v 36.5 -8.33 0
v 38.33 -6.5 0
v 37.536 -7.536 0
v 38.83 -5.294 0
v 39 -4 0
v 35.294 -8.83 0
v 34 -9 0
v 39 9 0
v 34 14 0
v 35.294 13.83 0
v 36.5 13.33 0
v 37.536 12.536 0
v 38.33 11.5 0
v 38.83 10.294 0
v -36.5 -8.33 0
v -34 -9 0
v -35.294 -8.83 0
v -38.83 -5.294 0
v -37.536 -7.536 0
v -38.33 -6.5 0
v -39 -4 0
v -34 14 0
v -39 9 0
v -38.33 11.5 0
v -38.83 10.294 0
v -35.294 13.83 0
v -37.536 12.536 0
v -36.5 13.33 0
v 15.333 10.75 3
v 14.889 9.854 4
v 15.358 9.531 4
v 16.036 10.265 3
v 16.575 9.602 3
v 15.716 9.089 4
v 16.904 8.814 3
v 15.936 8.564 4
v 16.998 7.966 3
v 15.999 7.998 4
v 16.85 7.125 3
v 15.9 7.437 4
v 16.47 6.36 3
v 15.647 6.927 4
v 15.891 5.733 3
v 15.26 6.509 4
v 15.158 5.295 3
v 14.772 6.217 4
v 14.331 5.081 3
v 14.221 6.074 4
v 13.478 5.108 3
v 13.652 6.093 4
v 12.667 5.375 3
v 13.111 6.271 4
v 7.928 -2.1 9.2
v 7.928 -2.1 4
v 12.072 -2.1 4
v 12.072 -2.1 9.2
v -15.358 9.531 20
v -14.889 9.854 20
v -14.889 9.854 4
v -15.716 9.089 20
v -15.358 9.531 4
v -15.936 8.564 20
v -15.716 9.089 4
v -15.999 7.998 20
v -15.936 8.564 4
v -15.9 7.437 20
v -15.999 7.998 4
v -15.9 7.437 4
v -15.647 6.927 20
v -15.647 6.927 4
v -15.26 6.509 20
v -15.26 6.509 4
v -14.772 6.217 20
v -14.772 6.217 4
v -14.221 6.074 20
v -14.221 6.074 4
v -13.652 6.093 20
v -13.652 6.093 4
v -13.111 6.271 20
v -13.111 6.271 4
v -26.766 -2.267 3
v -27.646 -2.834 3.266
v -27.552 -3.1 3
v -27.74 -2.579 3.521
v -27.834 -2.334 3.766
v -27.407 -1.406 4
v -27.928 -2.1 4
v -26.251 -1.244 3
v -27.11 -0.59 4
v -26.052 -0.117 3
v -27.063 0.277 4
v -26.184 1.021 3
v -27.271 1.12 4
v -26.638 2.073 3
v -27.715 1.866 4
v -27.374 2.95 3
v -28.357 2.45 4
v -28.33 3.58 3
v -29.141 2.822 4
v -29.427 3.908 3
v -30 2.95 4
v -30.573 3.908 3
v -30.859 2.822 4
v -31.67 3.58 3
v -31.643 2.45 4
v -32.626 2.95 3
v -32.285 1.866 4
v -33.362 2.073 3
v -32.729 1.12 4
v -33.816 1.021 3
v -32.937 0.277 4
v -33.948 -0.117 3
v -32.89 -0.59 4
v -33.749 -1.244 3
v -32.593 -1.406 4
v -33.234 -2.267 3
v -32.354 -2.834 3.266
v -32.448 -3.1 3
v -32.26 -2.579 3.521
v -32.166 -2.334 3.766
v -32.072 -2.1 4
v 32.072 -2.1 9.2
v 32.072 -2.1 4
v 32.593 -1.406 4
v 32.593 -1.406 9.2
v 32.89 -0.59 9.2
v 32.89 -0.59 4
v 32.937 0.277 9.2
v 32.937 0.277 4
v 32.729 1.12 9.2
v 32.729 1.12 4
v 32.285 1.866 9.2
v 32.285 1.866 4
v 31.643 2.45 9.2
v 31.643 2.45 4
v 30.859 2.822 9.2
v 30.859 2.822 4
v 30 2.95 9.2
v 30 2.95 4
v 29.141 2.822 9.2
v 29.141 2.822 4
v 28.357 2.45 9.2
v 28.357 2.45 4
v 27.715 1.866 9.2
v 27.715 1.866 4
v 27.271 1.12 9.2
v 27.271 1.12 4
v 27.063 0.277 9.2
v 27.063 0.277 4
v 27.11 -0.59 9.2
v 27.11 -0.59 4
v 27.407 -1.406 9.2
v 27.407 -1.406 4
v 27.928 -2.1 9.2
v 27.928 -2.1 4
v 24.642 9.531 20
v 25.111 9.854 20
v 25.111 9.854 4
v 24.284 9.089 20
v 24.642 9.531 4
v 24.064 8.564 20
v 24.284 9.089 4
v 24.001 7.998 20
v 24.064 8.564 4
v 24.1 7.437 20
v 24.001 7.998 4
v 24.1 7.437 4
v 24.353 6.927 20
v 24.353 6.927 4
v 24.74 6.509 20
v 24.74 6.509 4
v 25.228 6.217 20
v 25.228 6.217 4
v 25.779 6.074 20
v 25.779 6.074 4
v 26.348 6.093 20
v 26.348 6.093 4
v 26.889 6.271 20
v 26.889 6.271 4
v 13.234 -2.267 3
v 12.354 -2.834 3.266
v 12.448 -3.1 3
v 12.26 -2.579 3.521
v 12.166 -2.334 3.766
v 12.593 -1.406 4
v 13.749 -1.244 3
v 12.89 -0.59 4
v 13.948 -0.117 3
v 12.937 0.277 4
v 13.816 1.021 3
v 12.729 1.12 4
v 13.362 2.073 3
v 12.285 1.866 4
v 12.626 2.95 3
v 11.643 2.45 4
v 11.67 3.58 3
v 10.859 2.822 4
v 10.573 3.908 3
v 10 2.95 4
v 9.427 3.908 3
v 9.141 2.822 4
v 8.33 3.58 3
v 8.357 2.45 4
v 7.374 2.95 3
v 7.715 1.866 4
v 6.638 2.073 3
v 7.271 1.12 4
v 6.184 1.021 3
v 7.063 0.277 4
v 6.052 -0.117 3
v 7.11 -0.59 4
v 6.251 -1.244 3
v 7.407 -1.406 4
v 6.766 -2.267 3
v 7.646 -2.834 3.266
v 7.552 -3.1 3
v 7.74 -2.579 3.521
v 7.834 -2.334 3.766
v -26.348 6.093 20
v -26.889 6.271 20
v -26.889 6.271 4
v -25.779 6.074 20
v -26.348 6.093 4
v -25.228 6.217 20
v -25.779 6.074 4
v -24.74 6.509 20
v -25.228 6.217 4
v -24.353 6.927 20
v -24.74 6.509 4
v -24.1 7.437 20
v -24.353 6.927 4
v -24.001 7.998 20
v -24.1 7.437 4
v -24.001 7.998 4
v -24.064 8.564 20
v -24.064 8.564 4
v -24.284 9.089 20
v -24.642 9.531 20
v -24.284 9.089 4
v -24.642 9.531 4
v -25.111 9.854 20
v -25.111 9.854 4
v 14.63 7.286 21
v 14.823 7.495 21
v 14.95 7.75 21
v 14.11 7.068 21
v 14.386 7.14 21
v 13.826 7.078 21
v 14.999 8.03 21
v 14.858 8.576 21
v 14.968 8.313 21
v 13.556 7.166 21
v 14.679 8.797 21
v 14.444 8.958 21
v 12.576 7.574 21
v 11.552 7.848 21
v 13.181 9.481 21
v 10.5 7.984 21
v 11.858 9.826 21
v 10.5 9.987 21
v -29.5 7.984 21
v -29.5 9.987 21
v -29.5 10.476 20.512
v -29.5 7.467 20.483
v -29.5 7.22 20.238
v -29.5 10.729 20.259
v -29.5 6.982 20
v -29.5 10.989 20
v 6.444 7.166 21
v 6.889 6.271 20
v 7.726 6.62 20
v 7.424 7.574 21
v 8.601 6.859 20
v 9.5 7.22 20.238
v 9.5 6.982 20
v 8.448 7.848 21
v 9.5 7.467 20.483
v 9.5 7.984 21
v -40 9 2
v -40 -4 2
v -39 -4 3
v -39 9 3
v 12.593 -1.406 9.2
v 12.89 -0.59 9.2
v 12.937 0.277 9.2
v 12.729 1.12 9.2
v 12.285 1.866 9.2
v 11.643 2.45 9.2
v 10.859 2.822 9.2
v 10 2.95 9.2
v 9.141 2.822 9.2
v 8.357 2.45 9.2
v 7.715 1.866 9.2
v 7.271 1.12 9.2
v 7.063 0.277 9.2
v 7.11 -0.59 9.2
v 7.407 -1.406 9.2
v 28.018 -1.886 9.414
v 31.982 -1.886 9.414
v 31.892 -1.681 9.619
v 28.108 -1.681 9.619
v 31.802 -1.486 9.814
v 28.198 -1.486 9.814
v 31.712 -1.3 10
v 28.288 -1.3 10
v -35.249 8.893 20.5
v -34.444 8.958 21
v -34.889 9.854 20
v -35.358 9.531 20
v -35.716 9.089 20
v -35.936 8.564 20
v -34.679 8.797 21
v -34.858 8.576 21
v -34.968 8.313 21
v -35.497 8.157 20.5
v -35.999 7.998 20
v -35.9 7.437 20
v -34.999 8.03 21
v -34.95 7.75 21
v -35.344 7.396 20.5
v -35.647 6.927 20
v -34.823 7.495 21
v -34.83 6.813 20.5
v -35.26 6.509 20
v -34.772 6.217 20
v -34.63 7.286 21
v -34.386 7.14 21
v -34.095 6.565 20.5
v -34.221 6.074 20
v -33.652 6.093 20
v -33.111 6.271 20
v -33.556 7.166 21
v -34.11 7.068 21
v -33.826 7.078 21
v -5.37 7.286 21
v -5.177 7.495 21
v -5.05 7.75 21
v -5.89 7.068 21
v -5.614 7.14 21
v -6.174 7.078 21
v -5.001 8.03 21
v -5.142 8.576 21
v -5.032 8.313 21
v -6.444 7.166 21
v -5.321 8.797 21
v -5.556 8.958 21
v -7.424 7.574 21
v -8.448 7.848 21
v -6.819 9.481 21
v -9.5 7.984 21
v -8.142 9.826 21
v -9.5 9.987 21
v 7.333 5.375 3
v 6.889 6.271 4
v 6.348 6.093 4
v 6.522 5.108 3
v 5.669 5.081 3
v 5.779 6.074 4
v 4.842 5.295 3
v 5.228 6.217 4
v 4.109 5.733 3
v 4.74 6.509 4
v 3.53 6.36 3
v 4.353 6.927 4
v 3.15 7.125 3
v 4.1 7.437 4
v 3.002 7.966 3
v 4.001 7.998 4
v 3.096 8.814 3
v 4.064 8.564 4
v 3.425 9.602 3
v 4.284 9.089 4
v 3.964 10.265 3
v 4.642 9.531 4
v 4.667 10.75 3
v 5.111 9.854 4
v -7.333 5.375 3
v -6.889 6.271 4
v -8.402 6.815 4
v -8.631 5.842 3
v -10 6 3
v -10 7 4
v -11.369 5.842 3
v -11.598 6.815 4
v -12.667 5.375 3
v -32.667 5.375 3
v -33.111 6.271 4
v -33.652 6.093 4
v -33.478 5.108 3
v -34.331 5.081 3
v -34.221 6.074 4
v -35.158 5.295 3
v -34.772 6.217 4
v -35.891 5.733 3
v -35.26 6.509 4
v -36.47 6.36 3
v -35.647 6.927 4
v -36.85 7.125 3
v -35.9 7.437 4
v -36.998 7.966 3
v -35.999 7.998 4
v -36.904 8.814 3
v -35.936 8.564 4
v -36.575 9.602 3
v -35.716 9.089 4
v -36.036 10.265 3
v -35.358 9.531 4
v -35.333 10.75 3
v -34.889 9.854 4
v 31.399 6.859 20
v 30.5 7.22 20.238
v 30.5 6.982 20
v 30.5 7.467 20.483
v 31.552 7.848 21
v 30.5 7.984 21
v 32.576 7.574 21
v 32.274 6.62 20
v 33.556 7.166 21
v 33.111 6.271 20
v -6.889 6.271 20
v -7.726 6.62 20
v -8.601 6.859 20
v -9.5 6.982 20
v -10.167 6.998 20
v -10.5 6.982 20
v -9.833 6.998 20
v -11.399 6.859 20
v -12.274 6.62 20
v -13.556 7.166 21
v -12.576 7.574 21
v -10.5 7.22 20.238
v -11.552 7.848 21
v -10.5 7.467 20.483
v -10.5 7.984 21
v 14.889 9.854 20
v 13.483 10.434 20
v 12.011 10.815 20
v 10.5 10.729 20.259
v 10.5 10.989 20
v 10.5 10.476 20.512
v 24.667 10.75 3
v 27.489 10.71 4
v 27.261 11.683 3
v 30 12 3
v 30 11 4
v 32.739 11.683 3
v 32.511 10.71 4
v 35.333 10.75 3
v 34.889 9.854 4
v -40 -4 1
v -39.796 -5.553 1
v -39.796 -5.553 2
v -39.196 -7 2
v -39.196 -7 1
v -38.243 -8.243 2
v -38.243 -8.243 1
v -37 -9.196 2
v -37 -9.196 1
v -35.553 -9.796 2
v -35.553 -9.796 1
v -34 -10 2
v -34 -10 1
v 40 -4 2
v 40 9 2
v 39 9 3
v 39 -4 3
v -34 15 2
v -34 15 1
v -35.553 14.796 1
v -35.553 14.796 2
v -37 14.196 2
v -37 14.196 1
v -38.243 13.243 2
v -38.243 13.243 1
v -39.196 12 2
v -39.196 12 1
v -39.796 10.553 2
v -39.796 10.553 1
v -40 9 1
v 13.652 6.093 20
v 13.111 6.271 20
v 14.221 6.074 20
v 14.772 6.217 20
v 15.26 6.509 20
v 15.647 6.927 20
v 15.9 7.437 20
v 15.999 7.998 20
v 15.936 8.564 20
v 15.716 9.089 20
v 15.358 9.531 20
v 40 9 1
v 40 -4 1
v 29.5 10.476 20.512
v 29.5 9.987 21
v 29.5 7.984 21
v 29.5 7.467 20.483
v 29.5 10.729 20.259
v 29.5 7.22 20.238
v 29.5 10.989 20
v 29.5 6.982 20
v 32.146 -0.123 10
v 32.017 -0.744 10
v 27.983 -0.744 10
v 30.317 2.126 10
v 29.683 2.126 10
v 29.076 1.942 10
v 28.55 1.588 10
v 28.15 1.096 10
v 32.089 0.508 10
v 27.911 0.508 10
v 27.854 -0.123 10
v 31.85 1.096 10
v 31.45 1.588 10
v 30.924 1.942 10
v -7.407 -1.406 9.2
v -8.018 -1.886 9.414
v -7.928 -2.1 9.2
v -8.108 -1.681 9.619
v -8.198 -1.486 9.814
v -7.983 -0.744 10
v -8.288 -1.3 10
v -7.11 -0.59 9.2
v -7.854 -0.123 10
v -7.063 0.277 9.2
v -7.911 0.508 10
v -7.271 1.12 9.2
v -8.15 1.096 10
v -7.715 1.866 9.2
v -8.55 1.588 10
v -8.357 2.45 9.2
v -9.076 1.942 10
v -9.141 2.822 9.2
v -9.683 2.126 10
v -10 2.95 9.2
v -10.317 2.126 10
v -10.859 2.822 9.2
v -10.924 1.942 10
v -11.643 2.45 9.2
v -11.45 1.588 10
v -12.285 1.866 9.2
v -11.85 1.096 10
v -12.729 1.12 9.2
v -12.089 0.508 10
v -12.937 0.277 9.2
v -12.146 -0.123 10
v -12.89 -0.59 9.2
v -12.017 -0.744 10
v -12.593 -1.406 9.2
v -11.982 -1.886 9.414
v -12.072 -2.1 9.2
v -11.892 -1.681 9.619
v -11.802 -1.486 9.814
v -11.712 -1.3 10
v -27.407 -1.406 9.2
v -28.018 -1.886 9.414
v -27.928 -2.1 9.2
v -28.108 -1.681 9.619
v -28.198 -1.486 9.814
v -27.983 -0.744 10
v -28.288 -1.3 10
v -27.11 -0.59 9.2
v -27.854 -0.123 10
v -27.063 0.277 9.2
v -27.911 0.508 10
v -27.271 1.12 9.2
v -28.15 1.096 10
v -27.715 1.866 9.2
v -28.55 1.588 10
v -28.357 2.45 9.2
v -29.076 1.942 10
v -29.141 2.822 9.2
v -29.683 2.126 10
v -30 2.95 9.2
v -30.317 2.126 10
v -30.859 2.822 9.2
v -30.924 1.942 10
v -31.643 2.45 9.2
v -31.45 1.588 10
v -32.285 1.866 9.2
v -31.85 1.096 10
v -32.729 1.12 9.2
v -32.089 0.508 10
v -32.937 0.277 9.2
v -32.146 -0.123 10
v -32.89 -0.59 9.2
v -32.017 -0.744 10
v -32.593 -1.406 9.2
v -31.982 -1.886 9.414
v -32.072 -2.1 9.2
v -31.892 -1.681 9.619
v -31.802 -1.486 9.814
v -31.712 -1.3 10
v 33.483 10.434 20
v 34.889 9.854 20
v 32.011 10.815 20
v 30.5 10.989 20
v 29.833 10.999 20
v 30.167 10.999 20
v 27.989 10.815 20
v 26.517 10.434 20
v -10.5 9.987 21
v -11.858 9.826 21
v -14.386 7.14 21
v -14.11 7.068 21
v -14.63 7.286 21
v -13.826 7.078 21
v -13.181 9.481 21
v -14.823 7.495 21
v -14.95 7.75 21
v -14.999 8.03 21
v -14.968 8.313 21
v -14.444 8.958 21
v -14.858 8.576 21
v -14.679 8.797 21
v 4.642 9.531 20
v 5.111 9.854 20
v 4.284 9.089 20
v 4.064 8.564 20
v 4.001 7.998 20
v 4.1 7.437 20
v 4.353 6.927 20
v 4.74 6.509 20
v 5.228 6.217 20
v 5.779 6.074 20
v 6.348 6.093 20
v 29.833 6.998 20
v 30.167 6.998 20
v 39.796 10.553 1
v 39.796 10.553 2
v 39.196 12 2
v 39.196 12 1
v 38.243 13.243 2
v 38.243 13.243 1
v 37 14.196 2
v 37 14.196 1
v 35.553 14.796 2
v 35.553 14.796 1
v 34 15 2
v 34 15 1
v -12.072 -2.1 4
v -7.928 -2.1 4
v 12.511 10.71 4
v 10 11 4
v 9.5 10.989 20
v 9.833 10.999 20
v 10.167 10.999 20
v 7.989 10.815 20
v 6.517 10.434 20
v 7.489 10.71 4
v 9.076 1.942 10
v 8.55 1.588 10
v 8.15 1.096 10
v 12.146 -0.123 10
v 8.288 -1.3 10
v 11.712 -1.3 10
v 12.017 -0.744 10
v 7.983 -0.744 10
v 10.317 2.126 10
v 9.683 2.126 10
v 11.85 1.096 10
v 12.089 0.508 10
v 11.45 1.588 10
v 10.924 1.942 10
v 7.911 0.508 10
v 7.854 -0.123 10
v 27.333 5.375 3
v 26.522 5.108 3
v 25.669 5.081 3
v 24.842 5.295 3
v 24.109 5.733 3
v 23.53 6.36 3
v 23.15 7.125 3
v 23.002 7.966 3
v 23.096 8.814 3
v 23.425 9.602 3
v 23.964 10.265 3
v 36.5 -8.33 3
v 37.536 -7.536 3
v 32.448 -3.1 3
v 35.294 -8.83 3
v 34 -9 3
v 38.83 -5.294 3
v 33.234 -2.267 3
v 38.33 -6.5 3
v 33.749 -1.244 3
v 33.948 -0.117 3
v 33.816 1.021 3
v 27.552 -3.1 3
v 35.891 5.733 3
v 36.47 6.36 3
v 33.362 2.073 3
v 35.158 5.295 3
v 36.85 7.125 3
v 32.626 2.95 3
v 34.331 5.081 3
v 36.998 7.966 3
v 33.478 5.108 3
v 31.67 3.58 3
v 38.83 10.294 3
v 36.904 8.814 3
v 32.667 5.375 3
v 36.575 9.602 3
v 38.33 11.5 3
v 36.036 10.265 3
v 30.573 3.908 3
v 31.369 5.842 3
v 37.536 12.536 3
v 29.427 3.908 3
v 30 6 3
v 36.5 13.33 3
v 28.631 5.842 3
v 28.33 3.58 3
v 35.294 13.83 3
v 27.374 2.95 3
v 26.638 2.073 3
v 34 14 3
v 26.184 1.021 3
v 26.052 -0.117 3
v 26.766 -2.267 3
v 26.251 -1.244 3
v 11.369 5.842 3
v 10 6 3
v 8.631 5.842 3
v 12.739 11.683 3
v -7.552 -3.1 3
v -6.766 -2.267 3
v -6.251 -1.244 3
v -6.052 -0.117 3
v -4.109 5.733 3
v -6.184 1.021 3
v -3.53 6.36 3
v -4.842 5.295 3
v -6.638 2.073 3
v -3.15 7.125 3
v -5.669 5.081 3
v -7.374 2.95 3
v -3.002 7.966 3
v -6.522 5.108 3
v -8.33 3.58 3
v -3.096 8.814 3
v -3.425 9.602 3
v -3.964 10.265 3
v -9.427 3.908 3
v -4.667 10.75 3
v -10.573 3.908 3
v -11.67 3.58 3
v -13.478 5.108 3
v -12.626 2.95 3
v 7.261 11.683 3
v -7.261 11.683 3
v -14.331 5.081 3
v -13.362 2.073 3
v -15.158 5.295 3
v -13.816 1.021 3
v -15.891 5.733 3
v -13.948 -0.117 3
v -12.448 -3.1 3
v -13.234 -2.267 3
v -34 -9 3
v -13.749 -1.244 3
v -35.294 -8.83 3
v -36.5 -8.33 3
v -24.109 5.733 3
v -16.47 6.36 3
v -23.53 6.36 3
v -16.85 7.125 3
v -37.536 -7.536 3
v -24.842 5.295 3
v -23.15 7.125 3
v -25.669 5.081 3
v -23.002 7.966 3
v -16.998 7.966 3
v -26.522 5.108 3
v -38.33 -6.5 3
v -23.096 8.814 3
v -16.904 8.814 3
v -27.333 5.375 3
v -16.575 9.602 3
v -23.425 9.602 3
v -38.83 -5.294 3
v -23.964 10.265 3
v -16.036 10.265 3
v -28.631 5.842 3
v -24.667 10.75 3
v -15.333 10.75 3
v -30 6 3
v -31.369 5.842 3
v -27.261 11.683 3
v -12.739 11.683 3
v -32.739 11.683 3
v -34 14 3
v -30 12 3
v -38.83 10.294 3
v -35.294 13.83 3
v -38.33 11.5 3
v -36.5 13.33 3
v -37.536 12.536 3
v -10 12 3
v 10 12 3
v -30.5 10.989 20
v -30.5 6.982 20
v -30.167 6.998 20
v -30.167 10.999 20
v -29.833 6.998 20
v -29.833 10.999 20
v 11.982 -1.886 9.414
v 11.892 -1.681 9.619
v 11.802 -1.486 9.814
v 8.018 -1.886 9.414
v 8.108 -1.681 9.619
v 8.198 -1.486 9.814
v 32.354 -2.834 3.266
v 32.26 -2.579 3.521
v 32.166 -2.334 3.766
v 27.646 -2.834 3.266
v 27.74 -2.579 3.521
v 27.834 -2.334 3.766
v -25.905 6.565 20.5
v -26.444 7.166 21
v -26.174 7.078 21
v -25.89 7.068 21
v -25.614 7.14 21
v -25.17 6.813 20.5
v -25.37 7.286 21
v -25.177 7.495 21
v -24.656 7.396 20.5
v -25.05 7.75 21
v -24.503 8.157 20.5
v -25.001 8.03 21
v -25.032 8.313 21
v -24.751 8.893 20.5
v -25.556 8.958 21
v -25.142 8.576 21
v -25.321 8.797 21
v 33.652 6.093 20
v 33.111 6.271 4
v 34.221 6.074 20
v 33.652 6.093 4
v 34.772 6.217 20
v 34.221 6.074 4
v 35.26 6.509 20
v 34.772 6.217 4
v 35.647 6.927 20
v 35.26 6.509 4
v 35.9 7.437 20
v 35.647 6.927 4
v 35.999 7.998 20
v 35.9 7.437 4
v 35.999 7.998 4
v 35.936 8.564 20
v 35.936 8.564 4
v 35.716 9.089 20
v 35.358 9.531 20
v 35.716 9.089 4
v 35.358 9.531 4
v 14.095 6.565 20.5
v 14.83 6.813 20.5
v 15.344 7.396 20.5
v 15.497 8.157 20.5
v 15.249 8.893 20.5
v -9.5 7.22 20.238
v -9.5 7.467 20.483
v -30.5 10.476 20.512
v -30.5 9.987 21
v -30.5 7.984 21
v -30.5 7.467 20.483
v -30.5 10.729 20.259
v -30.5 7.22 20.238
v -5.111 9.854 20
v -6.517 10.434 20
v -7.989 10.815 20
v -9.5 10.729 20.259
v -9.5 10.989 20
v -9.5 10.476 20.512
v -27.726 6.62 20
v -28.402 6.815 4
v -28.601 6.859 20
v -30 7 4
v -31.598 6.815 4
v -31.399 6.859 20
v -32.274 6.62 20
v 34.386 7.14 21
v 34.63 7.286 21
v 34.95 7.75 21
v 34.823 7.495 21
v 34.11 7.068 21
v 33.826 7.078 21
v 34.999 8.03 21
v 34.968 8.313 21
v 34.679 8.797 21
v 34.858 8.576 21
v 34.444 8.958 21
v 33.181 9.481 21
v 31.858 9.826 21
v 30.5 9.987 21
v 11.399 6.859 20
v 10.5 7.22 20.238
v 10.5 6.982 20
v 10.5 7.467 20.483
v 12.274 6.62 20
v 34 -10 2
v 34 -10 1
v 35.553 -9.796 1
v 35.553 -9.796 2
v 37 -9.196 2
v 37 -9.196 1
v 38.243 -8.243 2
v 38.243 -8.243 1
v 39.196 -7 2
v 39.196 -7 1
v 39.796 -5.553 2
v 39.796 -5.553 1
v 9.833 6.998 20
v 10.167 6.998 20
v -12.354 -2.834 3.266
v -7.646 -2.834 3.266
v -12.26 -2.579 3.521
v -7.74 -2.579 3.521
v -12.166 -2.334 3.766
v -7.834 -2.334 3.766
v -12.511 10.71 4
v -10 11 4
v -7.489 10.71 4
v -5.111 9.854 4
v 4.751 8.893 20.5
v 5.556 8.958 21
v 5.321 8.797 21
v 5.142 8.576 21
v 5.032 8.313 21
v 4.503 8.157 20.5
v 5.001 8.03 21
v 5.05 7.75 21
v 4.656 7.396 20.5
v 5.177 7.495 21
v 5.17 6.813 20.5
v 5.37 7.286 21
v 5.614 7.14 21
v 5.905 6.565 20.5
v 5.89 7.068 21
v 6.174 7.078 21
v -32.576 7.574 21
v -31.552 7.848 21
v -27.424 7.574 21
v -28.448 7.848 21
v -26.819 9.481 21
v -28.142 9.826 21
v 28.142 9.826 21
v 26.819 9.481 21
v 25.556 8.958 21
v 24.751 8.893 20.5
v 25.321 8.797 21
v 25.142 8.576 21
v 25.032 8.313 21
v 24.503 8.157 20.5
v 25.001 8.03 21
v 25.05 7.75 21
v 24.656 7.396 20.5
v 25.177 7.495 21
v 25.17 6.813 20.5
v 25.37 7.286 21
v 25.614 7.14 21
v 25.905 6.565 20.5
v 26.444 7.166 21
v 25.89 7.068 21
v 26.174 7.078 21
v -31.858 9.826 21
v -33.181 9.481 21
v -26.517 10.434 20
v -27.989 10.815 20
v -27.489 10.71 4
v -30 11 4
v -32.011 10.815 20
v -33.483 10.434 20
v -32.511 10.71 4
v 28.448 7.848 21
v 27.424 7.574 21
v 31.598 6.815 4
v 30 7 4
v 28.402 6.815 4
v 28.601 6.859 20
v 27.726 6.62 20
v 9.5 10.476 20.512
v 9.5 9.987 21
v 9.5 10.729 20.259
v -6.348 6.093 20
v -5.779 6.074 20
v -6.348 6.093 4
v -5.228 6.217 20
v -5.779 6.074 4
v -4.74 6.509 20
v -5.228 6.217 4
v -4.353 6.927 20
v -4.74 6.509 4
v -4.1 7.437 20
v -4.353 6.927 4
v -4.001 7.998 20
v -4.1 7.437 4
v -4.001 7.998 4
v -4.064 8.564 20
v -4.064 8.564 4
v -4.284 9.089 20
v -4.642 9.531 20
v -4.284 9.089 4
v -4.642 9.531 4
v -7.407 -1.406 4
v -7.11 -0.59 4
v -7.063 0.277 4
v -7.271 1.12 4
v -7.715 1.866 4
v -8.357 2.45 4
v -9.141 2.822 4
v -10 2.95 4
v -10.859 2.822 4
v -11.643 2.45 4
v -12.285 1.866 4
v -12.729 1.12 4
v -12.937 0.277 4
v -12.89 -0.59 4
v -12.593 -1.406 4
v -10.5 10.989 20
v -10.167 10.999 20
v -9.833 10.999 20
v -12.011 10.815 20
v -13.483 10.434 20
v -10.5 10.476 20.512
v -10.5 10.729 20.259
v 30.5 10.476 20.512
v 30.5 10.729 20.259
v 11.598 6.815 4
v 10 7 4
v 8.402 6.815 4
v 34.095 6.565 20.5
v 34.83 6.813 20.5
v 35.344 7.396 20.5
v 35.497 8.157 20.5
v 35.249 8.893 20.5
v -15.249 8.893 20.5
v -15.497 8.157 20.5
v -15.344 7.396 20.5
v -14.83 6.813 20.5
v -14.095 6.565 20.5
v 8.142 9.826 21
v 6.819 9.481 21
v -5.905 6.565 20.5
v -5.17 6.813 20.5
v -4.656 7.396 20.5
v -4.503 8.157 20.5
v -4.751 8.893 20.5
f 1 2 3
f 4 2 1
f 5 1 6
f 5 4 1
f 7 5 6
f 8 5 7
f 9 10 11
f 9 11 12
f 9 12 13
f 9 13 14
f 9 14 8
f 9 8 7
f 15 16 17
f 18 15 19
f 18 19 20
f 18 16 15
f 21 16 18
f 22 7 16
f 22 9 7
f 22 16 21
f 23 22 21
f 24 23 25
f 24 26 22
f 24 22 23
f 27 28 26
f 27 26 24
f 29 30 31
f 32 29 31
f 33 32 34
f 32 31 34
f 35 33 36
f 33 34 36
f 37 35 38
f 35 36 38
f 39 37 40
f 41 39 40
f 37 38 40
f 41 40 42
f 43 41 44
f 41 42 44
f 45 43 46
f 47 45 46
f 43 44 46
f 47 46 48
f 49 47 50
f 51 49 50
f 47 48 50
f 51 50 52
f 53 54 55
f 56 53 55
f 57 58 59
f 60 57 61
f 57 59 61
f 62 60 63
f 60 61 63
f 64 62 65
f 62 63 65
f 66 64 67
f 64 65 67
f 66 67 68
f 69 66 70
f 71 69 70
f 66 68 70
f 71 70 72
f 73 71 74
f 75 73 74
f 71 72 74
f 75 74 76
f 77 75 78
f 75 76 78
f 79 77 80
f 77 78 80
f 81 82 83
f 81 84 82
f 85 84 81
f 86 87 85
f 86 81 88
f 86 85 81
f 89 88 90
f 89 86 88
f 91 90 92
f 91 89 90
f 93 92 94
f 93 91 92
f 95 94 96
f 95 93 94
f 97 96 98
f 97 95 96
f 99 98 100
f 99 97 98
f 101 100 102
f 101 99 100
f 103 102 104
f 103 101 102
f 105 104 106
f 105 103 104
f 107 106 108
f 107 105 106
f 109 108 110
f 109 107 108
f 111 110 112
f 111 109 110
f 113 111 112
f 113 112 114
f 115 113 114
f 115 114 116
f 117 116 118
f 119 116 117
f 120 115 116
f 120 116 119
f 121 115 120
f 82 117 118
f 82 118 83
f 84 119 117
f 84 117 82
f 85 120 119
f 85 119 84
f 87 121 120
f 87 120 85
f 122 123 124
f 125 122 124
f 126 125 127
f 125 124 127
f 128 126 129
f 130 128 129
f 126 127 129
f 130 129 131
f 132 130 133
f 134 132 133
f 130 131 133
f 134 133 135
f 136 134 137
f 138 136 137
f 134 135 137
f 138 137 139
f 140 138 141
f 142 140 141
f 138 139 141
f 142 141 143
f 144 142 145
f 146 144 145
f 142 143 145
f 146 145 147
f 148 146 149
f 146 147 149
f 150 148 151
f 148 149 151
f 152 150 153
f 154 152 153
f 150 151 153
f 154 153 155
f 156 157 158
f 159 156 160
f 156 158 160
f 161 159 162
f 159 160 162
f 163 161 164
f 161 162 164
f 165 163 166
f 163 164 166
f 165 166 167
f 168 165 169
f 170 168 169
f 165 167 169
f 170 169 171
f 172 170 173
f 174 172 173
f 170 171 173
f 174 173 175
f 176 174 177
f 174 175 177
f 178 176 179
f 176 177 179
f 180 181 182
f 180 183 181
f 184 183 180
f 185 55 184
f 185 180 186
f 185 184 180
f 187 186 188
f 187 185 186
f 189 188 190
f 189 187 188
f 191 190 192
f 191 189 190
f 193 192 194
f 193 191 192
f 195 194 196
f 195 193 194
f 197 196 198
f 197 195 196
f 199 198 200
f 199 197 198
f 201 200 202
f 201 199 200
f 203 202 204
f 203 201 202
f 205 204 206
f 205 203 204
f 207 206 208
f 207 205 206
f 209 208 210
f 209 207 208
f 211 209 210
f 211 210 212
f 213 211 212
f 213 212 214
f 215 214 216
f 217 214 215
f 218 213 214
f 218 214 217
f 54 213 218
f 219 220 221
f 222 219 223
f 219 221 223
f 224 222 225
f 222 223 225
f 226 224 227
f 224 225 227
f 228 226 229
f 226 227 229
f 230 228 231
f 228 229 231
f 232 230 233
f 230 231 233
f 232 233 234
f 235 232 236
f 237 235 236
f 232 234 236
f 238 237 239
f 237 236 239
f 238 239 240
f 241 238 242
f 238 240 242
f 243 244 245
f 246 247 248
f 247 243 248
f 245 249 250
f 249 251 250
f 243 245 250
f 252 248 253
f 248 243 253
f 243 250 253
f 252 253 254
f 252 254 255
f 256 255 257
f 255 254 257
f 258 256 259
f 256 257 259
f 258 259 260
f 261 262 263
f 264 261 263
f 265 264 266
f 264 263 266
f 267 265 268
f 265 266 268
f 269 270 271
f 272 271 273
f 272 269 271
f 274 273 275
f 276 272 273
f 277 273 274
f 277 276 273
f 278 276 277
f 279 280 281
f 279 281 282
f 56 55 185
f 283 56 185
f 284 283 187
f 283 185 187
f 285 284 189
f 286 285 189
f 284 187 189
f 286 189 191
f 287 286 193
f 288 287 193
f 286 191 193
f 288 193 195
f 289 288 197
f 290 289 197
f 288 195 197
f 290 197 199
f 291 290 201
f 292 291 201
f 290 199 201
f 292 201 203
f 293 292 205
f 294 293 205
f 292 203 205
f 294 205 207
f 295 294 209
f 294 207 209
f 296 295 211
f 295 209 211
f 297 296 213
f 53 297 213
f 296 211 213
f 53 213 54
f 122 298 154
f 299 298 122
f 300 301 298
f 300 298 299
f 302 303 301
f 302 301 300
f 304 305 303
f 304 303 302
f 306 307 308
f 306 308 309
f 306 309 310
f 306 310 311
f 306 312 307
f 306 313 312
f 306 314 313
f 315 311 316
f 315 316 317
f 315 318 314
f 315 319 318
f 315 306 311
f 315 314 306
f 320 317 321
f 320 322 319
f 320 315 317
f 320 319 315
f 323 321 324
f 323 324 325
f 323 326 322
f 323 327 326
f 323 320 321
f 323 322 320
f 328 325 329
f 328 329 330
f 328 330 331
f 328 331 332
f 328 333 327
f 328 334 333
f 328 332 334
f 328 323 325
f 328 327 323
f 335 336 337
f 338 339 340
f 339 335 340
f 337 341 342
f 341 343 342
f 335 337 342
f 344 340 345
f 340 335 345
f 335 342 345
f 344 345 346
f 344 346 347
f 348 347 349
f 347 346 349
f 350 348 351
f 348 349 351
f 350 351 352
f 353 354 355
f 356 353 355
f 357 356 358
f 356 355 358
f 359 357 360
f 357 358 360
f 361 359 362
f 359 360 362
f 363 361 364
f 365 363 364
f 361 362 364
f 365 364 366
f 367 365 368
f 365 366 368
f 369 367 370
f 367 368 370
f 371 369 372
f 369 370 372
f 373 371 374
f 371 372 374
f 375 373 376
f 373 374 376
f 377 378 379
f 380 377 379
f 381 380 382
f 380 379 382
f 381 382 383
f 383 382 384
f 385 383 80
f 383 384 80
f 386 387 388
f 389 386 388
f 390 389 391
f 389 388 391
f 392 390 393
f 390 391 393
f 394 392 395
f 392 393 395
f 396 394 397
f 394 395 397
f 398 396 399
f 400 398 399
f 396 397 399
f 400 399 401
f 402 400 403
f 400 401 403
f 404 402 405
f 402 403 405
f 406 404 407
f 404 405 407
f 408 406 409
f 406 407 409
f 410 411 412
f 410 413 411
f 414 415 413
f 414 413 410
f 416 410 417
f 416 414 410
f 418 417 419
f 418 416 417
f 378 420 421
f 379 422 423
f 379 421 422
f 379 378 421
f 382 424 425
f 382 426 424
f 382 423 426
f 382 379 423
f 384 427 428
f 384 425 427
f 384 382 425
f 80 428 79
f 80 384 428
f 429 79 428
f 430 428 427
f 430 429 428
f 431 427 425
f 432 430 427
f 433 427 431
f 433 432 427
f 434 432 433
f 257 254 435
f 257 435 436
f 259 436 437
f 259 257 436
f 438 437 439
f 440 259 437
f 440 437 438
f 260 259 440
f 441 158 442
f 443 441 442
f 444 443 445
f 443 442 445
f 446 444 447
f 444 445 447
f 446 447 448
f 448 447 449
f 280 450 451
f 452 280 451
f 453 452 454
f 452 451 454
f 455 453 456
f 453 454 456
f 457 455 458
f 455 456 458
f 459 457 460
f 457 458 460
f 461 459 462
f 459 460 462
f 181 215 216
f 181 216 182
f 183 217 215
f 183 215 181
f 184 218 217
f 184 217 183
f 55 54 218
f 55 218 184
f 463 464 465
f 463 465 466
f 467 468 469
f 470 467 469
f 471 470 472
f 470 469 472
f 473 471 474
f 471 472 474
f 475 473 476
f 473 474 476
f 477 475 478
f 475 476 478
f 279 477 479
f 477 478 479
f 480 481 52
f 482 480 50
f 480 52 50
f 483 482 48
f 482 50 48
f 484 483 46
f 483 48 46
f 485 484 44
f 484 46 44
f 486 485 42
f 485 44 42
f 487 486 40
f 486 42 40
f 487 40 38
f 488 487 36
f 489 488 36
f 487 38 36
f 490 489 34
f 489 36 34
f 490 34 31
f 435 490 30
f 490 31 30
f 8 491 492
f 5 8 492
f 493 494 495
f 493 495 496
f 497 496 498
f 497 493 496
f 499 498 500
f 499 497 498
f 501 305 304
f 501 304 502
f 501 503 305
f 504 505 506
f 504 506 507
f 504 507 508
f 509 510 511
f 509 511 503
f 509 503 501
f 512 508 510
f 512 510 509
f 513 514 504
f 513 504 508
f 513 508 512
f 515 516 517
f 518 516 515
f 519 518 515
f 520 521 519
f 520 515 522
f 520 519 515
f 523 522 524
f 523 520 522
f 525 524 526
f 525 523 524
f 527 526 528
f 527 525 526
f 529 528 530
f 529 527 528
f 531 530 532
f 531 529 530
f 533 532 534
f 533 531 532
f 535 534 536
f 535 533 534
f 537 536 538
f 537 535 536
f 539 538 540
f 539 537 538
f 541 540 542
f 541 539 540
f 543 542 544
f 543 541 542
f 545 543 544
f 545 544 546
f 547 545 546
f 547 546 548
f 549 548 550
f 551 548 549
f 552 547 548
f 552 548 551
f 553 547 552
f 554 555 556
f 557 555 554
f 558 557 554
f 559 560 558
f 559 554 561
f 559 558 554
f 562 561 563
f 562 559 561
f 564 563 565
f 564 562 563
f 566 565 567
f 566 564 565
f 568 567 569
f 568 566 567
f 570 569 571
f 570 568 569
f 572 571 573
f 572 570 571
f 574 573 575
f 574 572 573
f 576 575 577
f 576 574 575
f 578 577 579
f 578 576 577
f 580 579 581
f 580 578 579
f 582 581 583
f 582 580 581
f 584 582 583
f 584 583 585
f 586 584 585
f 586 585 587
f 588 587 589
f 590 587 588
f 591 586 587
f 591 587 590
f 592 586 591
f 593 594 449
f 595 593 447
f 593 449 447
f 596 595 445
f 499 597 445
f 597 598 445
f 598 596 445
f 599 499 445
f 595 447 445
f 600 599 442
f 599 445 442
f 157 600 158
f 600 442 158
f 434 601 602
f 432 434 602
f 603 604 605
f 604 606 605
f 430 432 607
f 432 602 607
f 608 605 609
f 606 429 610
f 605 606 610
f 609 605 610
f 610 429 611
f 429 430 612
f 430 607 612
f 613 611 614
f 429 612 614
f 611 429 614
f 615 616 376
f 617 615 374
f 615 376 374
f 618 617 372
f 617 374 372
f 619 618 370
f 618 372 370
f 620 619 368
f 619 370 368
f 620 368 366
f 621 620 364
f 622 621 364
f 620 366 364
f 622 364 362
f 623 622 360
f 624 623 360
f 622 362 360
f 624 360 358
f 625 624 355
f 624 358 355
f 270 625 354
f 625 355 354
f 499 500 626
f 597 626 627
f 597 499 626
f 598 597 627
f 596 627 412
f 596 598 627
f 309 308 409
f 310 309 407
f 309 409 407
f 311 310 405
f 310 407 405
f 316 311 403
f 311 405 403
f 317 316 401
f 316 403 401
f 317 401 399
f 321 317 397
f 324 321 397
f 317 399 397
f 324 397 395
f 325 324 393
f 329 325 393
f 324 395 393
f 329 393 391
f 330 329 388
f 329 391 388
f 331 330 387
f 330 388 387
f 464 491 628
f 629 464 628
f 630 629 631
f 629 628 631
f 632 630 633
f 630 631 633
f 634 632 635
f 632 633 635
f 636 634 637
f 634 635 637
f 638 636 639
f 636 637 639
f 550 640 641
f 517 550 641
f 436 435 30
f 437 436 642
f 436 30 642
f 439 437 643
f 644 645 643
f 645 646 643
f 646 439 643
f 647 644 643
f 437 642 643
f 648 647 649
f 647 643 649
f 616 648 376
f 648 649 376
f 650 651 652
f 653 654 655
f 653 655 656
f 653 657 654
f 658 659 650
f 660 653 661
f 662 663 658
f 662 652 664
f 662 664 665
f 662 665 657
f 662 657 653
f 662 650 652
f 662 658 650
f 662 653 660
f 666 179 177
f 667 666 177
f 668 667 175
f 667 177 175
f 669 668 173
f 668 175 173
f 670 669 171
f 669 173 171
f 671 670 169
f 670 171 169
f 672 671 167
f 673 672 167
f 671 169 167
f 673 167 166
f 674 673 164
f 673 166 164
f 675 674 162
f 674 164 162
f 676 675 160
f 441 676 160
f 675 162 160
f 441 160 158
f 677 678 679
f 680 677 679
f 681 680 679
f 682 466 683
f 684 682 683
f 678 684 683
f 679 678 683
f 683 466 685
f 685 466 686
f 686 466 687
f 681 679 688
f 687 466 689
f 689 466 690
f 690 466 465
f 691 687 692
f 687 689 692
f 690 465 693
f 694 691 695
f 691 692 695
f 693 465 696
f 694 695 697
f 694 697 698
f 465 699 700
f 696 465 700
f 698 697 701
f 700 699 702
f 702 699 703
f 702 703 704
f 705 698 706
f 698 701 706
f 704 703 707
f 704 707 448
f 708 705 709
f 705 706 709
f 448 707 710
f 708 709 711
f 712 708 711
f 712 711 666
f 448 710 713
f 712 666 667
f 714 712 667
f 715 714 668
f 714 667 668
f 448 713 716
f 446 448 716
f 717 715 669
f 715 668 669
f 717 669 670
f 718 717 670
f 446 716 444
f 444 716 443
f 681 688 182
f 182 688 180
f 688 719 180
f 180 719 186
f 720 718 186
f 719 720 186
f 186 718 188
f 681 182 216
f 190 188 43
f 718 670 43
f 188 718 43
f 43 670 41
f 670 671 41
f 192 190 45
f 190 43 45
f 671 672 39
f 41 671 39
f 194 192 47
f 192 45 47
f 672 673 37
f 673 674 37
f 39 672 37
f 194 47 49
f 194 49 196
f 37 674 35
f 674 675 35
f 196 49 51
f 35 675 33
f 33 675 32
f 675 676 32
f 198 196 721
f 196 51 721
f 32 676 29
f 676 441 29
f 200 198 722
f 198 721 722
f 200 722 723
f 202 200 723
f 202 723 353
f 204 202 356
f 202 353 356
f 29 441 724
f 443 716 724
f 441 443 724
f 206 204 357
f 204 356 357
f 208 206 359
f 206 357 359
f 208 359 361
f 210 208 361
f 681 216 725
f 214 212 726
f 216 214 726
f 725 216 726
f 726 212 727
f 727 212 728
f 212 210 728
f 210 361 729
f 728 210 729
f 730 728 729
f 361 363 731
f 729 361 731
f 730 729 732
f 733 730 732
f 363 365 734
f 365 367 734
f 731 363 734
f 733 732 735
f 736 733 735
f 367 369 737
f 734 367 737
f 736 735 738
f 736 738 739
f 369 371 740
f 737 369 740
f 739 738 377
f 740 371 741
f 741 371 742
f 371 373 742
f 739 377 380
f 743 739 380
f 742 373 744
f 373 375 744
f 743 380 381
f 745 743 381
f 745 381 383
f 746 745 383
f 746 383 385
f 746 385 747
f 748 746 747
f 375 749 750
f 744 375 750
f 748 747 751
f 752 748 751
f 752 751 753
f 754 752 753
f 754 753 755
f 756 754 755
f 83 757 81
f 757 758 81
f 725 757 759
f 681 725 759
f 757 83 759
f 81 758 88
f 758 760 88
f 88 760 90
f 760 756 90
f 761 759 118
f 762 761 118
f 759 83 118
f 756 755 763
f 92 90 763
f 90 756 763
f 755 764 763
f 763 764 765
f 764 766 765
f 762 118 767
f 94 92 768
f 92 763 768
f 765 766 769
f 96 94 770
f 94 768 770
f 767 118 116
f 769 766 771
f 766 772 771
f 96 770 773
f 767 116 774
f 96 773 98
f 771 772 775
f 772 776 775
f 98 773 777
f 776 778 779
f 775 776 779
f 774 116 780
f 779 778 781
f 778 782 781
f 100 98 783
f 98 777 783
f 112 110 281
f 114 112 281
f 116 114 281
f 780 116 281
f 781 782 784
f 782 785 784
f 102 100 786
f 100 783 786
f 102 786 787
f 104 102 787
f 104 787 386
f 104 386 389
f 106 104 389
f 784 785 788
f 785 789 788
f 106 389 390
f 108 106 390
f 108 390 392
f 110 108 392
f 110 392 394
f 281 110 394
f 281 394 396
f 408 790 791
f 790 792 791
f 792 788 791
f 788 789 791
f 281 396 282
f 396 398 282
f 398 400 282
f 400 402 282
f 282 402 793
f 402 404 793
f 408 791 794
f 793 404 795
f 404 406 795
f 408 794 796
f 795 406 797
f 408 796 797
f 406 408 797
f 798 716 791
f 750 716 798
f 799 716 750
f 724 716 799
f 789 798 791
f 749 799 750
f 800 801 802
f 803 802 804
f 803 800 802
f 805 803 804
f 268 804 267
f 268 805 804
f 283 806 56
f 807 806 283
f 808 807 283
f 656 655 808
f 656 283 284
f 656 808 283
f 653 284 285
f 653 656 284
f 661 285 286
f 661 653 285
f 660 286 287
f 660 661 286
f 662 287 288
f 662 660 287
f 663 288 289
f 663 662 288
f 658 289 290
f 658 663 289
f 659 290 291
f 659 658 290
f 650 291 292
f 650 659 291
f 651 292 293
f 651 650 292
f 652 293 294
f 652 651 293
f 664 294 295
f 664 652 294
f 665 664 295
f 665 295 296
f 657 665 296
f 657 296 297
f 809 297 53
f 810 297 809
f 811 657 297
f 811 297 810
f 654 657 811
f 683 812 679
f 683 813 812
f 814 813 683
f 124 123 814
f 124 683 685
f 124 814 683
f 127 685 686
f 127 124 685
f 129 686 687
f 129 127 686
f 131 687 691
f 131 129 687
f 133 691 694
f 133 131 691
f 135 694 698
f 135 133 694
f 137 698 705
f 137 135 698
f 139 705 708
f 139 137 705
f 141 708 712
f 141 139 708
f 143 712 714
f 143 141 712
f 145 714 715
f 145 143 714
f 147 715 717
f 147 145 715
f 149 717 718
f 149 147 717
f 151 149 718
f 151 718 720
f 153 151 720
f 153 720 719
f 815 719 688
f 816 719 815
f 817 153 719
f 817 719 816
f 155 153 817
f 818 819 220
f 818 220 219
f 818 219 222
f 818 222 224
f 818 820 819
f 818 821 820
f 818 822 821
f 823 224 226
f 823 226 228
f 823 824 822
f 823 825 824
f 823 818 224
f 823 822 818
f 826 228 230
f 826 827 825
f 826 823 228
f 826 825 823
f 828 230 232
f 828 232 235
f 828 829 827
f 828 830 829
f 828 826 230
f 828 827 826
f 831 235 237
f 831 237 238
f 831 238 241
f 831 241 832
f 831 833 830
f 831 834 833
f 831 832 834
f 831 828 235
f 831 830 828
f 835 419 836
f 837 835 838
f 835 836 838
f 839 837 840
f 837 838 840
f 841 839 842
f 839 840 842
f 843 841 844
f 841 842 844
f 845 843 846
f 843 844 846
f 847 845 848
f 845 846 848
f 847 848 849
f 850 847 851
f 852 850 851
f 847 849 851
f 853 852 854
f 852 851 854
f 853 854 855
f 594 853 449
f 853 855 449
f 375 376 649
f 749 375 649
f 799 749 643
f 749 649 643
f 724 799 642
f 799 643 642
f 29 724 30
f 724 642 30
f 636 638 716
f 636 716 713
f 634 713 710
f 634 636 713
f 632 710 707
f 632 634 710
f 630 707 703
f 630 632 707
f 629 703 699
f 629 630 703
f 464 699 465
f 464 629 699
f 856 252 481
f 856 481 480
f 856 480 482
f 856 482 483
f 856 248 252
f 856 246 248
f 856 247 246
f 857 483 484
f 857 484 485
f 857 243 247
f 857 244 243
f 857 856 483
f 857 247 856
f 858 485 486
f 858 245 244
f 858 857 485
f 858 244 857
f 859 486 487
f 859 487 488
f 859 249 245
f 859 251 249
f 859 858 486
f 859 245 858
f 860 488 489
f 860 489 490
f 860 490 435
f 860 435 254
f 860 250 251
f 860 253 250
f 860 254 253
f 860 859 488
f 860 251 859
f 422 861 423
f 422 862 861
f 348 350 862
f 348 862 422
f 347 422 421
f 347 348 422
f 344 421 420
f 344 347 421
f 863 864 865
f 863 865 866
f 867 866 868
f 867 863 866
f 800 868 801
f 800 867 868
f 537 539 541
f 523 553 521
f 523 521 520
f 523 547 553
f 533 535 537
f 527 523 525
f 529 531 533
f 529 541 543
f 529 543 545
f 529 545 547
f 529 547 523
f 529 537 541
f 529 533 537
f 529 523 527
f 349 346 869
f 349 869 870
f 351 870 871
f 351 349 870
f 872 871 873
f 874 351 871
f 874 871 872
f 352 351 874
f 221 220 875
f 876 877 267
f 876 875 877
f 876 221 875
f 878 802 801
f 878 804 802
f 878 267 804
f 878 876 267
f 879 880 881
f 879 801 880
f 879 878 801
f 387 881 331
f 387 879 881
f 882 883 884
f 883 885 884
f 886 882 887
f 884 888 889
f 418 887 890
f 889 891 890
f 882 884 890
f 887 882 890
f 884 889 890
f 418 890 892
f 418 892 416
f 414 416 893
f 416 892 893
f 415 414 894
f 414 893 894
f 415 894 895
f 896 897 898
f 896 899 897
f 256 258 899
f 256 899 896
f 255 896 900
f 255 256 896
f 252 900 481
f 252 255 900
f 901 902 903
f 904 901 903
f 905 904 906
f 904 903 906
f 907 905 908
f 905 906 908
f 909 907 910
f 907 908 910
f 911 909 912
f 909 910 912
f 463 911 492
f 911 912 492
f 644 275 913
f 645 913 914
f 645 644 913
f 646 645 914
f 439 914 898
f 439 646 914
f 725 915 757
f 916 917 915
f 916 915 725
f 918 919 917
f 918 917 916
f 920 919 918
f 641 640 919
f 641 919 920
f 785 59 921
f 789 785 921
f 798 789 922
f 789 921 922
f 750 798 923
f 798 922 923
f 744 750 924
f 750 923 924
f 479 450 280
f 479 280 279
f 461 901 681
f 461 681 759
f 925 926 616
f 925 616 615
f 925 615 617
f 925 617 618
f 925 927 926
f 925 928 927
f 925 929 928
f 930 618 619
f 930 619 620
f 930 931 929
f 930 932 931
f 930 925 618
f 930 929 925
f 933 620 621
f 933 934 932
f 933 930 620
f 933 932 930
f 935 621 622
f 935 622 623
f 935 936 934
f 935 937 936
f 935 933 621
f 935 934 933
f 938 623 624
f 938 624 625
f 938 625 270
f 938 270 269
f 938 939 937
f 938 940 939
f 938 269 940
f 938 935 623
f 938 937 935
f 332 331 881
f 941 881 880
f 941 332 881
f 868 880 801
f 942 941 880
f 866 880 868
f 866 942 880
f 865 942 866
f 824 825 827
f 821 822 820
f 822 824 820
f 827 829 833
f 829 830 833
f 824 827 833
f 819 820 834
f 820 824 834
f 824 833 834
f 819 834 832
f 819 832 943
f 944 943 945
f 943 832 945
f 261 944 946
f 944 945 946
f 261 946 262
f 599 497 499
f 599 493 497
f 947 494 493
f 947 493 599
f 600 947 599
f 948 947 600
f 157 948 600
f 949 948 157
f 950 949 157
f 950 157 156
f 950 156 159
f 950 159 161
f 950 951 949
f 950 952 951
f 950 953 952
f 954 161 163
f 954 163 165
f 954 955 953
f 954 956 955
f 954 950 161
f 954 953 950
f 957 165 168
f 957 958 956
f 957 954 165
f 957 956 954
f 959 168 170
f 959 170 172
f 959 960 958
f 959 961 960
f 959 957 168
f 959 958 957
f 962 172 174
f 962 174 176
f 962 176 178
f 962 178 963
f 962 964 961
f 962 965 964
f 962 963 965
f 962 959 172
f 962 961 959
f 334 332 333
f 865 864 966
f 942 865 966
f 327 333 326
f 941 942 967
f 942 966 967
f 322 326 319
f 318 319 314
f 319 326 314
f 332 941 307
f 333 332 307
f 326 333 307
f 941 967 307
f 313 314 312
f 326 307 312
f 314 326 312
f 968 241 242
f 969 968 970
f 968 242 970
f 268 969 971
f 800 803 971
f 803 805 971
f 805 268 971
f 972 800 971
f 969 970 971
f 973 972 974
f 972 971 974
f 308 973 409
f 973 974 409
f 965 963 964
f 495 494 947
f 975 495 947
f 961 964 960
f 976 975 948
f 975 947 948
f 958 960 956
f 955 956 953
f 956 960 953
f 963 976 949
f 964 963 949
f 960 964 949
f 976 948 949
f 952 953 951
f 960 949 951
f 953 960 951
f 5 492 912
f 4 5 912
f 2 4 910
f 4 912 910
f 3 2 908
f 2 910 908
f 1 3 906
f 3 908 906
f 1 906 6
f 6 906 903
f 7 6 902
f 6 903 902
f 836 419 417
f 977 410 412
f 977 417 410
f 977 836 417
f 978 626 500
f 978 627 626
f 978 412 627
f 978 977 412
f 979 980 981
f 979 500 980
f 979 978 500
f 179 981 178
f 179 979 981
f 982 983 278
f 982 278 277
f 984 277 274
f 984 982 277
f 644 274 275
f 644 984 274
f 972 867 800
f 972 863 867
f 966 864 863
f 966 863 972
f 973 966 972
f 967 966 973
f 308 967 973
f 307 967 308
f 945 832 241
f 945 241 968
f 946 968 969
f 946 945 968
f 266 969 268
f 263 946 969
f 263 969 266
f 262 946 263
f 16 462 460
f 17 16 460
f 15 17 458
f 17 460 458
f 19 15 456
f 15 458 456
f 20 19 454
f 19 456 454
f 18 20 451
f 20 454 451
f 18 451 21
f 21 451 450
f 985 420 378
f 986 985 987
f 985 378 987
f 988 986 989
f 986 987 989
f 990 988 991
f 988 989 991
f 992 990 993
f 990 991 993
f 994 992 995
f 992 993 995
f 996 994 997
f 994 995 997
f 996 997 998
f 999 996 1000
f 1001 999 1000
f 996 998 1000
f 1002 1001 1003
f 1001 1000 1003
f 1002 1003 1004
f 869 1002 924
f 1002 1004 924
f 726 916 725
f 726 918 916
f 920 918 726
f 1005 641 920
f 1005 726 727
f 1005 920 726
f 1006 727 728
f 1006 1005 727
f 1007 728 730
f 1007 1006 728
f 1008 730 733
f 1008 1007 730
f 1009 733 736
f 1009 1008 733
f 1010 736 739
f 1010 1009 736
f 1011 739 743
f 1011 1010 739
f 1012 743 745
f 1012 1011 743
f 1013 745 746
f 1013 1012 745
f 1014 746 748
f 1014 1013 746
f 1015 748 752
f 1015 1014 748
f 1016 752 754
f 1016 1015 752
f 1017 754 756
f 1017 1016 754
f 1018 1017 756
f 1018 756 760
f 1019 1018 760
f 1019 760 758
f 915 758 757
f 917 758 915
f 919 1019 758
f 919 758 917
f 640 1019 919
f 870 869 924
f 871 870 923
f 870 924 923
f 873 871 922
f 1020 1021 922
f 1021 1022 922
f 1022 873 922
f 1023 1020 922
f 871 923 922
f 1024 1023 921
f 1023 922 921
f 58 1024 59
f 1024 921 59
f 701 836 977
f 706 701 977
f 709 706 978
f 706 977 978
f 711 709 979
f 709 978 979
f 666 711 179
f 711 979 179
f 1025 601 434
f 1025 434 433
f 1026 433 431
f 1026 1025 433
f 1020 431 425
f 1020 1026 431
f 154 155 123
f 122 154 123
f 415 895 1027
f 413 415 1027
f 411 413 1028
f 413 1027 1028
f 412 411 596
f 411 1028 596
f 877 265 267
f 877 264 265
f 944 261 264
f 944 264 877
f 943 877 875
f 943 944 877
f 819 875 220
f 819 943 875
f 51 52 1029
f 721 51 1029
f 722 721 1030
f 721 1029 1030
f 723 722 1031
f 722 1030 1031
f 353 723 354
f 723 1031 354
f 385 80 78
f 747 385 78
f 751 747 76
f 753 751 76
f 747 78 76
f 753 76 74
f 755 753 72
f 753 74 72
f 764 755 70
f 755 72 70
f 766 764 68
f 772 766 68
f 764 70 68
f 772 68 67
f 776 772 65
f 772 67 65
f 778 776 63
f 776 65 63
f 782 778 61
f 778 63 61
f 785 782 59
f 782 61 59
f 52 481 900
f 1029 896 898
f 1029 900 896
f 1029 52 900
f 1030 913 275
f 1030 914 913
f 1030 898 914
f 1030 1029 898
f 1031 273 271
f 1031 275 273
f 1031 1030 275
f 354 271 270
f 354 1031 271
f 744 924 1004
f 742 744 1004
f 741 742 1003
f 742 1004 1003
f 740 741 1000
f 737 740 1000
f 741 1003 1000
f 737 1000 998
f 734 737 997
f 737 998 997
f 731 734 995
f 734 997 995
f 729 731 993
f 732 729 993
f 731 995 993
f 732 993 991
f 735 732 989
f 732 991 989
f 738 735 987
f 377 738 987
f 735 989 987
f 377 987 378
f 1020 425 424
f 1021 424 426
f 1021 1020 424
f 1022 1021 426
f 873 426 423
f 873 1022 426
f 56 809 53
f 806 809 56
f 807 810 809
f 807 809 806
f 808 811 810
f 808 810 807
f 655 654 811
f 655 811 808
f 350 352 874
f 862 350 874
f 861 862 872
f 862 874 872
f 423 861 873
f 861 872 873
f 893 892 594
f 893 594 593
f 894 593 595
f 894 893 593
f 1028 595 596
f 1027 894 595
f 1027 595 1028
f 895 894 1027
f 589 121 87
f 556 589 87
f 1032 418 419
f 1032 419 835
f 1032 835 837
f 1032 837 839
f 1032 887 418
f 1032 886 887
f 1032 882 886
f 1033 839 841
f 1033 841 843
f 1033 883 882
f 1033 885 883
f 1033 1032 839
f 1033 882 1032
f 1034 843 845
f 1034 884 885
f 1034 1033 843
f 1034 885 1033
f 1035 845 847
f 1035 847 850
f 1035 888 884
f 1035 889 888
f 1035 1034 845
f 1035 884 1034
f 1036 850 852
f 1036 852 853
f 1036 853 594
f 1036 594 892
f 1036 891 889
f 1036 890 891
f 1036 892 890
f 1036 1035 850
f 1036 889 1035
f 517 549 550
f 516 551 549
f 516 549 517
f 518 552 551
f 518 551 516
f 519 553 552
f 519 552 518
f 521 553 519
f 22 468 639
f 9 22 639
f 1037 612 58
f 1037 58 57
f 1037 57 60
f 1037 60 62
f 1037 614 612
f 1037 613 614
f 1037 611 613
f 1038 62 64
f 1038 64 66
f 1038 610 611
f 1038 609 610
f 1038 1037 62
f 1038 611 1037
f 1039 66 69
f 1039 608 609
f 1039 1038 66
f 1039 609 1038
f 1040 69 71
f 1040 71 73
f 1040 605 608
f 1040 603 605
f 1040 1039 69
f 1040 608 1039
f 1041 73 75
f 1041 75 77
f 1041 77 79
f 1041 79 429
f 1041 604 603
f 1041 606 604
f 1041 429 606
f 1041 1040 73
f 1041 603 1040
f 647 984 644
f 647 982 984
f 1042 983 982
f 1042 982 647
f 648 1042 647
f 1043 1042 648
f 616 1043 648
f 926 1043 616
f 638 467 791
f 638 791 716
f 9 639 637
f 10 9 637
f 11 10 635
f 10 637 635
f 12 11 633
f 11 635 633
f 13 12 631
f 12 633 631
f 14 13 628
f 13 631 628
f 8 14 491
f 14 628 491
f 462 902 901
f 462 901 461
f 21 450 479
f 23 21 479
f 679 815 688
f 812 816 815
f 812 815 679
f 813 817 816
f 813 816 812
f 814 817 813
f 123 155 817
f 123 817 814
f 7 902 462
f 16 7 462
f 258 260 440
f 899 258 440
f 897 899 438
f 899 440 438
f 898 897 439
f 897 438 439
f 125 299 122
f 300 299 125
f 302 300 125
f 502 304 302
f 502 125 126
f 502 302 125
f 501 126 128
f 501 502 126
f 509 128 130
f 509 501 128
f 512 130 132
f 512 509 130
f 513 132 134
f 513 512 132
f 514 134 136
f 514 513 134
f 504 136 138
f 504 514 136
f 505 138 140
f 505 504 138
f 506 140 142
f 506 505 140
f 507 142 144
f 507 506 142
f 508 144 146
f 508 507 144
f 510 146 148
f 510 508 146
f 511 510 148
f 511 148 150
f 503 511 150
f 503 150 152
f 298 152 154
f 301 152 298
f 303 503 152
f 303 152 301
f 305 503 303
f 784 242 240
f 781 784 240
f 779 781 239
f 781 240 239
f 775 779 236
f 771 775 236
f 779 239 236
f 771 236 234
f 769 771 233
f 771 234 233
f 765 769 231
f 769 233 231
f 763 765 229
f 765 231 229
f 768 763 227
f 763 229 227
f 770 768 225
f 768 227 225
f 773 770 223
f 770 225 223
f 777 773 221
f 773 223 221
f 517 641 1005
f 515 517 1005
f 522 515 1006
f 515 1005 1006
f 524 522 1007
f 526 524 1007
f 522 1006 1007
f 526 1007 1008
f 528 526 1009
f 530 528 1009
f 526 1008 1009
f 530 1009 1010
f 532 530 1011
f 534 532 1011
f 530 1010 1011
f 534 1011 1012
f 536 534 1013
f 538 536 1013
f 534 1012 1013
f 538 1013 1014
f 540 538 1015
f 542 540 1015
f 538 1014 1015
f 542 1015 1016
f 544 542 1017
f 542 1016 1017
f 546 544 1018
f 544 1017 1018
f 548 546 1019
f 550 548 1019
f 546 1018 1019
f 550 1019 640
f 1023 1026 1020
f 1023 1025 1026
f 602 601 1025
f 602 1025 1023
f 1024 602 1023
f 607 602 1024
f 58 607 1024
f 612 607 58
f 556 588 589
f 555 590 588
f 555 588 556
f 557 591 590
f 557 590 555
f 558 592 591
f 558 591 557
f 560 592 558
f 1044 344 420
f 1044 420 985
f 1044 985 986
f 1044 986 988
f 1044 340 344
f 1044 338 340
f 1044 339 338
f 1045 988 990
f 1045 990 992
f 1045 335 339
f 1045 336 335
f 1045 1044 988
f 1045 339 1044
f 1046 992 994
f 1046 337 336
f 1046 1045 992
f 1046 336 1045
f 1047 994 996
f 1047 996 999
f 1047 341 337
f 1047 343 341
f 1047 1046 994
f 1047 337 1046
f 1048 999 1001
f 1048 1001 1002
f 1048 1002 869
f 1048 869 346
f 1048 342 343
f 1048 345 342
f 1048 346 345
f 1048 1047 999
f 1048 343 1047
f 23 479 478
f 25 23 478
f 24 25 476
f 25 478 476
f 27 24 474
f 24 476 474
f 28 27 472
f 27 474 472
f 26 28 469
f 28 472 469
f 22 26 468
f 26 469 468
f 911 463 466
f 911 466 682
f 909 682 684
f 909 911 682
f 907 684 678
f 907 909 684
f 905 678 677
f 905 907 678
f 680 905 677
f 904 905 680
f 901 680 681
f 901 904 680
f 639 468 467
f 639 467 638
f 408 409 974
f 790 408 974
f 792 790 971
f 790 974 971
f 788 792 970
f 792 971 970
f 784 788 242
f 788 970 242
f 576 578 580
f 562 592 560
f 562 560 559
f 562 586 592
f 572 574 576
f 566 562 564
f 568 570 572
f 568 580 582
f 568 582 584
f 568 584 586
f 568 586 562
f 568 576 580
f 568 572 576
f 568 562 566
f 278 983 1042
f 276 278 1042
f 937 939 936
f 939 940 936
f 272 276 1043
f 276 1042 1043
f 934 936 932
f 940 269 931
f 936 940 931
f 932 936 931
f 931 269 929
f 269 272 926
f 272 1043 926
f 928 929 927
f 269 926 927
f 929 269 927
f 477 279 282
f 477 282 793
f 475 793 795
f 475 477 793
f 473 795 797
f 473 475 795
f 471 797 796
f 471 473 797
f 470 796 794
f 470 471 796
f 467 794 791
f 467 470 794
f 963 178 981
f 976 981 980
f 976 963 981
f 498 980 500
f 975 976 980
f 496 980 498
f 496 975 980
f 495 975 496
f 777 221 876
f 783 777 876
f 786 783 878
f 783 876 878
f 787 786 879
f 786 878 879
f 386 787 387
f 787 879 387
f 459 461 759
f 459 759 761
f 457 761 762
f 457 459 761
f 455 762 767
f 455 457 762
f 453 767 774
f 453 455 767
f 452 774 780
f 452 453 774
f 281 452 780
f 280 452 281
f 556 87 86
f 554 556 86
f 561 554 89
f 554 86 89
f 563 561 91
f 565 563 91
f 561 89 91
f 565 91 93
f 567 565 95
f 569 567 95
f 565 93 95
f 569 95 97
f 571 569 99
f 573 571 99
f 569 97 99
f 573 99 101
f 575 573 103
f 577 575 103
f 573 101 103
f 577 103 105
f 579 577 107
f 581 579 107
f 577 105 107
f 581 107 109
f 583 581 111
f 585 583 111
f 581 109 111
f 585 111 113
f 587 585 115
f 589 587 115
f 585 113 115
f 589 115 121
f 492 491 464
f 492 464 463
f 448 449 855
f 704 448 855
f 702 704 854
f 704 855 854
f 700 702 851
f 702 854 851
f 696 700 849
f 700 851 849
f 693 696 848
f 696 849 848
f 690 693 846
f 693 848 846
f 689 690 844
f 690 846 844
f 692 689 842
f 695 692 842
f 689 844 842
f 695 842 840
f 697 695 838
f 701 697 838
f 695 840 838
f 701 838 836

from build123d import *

# Parameters (mm, degrees)
PAD_DEPTH              = 3
PAD001_DEPTH           = 7
PAD002_DEPTH           = 18
SKETCH003_W            = 1
SKETCH003_H            = 10.328695
POCKET_DEPTH           = 1
LINEARPATTERN_COUNT    = 4
LINEARPATTERN_PITCH    = 20
LINEARPATTERN001_COUNT = 4
LINEARPATTERN001_PITCH = 20
LINEARPATTERN002_COUNT = 4
LINEARPATTERN002_PITCH = 20
CHAMFER_SIZE           = 1
CHAMFER001_SIZE        = 0.8
CHAMFER002_SIZE        = 1


with BuildPart() as part:
    # Sketch → Pad (new body)
    with BuildSketch(Plane.XY):
        with BuildLine():
            Line((-34, 15), (34, 15))
            ThreePointArc((40, 9), (38.242641, 13.242641), (34, 15))
            Line((40, 9), (40, -4))
            ThreePointArc((34, -10), (38.242641, -8.242641), (40, -4))
            Line((34, -10), (-34, -10))
            ThreePointArc((-40, -4), (-38.242641, -8.242641), (-34, -10))
            Line((-40, -4), (-40, 9))
            ThreePointArc((-34, 15), (-38.242641, 13.242641), (-40, 9))
        make_face()
    extrude(amount=PAD_DEPTH)

    # Sketch001 (on Face10 of Pad) → Pad001 (join)
    with BuildSketch(Plane.XY.offset(3)):
        with BuildLine():
            Line((-32.071835, -2.1), (-27.928165, -2.1))
            ThreePointArc((-27.928165, -2.1), (-30, 2.95), (-32.071835, -2.1))
        make_face()
    pad001 = extrude(amount=PAD001_DEPTH)

    # Sketch002 (on Face5 of Pad001) → Pad002 (join)
    with BuildSketch(Plane.XY.offset(3)):
        with BuildLine():
            ThreePointArc((-26.888889, 6.270645), (-30, 7), (-33.111111, 6.270645))
            ThreePointArc((-34.888889, 9.853871), (-35.791613, 7.173369), (-33.111111, 6.270645))
            ThreePointArc((-25.111111, 9.853871), (-30, 11), (-34.888889, 9.853871))
            ThreePointArc((-26.888889, 6.270645), (-24.208387, 7.173369), (-25.111111, 9.853871))
        make_face()
    pad002 = extrude(amount=PAD002_DEPTH)

    # Sketch003 (on Face18 of Pad002) → Pocket (cut)
    with BuildSketch(Plane.XY.offset(21)):
        with Locations((-30, 9.690067)):
            Rectangle(SKETCH003_W, SKETCH003_H)
    pocket = extrude(amount=-POCKET_DEPTH, mode=Mode.SUBTRACT)

    # LinearPattern: Pad001 ×4
    with Locations(*[(i * LINEARPATTERN_PITCH, 0, 0) for i in range(1, LINEARPATTERN_COUNT)]):
        add(pad001)

    # LinearPattern001: Pad002 ×4
    with Locations(*[(i * LINEARPATTERN001_PITCH, 0, 0) for i in range(1, LINEARPATTERN001_COUNT)]):
        add(pad002)

    # LinearPattern002: Pocket ×4
    with Locations(*[(i * LINEARPATTERN002_PITCH, 0, 0) for i in range(1, LINEARPATTERN002_COUNT)]):
        add(pocket, mode=Mode.SUBTRACT)

    # Chamfer
    chamfer_edges = [part.edges().sort_by_distance(p)[0] for p in [
        (-40, 2.5, 3),
        (-38.242641, -8.242641, 3),
        (-38.242641, 13.242641, 3),
        (0, -10, 3),
        (0, 15, 3),
        (38.242641, -8.242641, 3),
        (38.242641, 13.242641, 3),
        (40, 2.5, 3),
        (10, 7, 3),
        (15.791613, 7.173369, 3),
        (4.208387, 7.173369, 3),
        (10, 11, 3),
        (-10, 7, 3),
        (-4.208387, 7.173369, 3),
        (-15.791613, 7.173369, 3),
        (-10, 11, 3),
        (-30, 7, 3),
        (-24.208387, 7.173369, 3),
        (-35.791613, 7.173369, 3),
        (-30, 11, 3),
        (-30, 2.95, 3),
        (-30, -2.1, 3),
        (30, 2.95, 3),
        (30, -2.1, 3),
        (30, 7, 3),
        (24.208387, 7.173369, 3),
        (30, 11, 3),
        (35.791613, 7.173369, 3),
        (-10, 2.95, 3),
        (-10, -2.1, 3),
        (10, 2.95, 3),
        (10, -2.1, 3),
        (-40, 2.5, 0),
        (-38.242641, 13.242641, 0),
        (0, 15, 0),
        (38.242641, 13.242641, 0),
        (40, 2.5, 0),
        (38.242641, -8.242641, 0),
        (0, -10, 0),
        (-38.242641, -8.242641, 0),
    ]]
    chamfer(chamfer_edges, length=CHAMFER_SIZE)

    # Chamfer001
    chamfer001_edges = [part.edges().sort_by_distance(p)[0] for p in [
        (-30, -2.1, 10),
        (-30, 2.95, 10),
        (-10, -2.1, 10),
        (-10, 2.95, 10),
        (10, -2.1, 10),
        (10, 2.95, 10),
        (30, -2.1, 10),
        (30, 2.95, 10),
    ]]
    chamfer(chamfer001_edges, length=CHAMFER001_SIZE)

    # Chamfer002
    chamfer002_edges = [part.edges().sort_by_distance(p)[0] for p in [
        (-35.791613, 7.173369, 21),
        (-24.208387, 7.173369, 21),
        (-15.791613, 7.173369, 21),
        (-4.208387, 7.173369, 21),
        (4.208387, 7.173369, 21),
        (15.791613, 7.173369, 21),
        (24.208387, 7.173369, 21),
        (35.791613, 7.173369, 21),
    ]]
    chamfer(chamfer002_edges, length=CHAMFER002_SIZE)


solid = part.part
